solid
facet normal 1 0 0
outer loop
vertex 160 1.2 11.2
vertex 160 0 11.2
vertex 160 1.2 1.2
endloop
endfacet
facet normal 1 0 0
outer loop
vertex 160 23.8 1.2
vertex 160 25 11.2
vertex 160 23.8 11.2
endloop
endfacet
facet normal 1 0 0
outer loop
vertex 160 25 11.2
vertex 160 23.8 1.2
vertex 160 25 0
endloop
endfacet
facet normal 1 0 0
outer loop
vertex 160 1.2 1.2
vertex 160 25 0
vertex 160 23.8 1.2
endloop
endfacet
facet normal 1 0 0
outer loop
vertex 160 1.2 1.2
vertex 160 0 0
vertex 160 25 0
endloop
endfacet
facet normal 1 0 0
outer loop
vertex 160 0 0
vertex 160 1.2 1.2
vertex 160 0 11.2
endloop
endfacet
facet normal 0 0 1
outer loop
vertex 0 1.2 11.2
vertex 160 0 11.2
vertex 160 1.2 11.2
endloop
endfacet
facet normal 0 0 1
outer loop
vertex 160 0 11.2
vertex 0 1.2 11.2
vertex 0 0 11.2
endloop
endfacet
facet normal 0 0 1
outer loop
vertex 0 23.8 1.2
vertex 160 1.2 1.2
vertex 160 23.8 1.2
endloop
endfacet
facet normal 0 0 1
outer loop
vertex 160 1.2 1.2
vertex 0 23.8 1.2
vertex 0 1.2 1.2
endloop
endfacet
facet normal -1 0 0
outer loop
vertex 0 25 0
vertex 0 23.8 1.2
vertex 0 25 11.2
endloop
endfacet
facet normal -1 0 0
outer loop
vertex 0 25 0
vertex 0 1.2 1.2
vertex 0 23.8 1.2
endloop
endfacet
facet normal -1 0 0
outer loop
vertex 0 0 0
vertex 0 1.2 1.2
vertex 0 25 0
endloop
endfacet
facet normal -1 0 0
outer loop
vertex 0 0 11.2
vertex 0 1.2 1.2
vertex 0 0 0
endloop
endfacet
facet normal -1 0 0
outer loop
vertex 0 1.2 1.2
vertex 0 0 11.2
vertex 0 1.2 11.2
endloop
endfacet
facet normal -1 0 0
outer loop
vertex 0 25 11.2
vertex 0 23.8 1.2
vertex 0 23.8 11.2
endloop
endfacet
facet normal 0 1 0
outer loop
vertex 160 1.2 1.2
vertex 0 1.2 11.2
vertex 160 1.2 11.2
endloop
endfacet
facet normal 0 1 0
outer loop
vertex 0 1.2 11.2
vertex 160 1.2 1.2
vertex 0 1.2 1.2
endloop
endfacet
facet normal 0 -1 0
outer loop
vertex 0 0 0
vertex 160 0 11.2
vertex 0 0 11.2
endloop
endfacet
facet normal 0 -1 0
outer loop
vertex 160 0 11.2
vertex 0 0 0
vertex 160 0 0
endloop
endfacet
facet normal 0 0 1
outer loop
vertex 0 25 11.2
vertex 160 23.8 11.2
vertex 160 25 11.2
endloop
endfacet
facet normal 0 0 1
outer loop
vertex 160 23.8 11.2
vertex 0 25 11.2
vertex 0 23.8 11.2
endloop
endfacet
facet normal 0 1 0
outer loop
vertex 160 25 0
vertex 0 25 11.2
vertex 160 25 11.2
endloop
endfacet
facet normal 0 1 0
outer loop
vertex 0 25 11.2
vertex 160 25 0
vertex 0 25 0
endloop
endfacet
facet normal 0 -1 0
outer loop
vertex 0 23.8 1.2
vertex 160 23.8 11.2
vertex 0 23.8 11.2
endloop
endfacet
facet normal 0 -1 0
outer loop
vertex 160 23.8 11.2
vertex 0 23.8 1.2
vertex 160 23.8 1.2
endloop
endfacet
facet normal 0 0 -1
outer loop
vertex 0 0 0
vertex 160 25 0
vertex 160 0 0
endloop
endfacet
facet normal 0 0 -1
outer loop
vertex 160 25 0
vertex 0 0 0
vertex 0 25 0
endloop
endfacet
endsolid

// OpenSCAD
// ScienceClaw nominal U-channel. All dimensions in millimeters.
// Clamp the first clamp_length along x. No holes or clamp reinforcement.
// Print parameters, layer orientation, material batch, and actual dimensions
// must be recorded separately; this file does not prescribe a qualified process.
length = 160;
clamp_length = 25;
base_width = 25;
wall_height = 10;
thickness = 1.2;
assert(length > clamp_length && clamp_length > 0);
assert(base_width > 2 * thickness && thickness > 0 && wall_height >= 0);
union() {
    cube([length, base_width, thickness]);
    if (wall_height > 0) {
        translate([0, 0, thickness]) cube([length, thickness, wall_height]);
        translate([0, base_width - thickness, thickness]) cube([length, thickness, wall_height]);
    }
}
